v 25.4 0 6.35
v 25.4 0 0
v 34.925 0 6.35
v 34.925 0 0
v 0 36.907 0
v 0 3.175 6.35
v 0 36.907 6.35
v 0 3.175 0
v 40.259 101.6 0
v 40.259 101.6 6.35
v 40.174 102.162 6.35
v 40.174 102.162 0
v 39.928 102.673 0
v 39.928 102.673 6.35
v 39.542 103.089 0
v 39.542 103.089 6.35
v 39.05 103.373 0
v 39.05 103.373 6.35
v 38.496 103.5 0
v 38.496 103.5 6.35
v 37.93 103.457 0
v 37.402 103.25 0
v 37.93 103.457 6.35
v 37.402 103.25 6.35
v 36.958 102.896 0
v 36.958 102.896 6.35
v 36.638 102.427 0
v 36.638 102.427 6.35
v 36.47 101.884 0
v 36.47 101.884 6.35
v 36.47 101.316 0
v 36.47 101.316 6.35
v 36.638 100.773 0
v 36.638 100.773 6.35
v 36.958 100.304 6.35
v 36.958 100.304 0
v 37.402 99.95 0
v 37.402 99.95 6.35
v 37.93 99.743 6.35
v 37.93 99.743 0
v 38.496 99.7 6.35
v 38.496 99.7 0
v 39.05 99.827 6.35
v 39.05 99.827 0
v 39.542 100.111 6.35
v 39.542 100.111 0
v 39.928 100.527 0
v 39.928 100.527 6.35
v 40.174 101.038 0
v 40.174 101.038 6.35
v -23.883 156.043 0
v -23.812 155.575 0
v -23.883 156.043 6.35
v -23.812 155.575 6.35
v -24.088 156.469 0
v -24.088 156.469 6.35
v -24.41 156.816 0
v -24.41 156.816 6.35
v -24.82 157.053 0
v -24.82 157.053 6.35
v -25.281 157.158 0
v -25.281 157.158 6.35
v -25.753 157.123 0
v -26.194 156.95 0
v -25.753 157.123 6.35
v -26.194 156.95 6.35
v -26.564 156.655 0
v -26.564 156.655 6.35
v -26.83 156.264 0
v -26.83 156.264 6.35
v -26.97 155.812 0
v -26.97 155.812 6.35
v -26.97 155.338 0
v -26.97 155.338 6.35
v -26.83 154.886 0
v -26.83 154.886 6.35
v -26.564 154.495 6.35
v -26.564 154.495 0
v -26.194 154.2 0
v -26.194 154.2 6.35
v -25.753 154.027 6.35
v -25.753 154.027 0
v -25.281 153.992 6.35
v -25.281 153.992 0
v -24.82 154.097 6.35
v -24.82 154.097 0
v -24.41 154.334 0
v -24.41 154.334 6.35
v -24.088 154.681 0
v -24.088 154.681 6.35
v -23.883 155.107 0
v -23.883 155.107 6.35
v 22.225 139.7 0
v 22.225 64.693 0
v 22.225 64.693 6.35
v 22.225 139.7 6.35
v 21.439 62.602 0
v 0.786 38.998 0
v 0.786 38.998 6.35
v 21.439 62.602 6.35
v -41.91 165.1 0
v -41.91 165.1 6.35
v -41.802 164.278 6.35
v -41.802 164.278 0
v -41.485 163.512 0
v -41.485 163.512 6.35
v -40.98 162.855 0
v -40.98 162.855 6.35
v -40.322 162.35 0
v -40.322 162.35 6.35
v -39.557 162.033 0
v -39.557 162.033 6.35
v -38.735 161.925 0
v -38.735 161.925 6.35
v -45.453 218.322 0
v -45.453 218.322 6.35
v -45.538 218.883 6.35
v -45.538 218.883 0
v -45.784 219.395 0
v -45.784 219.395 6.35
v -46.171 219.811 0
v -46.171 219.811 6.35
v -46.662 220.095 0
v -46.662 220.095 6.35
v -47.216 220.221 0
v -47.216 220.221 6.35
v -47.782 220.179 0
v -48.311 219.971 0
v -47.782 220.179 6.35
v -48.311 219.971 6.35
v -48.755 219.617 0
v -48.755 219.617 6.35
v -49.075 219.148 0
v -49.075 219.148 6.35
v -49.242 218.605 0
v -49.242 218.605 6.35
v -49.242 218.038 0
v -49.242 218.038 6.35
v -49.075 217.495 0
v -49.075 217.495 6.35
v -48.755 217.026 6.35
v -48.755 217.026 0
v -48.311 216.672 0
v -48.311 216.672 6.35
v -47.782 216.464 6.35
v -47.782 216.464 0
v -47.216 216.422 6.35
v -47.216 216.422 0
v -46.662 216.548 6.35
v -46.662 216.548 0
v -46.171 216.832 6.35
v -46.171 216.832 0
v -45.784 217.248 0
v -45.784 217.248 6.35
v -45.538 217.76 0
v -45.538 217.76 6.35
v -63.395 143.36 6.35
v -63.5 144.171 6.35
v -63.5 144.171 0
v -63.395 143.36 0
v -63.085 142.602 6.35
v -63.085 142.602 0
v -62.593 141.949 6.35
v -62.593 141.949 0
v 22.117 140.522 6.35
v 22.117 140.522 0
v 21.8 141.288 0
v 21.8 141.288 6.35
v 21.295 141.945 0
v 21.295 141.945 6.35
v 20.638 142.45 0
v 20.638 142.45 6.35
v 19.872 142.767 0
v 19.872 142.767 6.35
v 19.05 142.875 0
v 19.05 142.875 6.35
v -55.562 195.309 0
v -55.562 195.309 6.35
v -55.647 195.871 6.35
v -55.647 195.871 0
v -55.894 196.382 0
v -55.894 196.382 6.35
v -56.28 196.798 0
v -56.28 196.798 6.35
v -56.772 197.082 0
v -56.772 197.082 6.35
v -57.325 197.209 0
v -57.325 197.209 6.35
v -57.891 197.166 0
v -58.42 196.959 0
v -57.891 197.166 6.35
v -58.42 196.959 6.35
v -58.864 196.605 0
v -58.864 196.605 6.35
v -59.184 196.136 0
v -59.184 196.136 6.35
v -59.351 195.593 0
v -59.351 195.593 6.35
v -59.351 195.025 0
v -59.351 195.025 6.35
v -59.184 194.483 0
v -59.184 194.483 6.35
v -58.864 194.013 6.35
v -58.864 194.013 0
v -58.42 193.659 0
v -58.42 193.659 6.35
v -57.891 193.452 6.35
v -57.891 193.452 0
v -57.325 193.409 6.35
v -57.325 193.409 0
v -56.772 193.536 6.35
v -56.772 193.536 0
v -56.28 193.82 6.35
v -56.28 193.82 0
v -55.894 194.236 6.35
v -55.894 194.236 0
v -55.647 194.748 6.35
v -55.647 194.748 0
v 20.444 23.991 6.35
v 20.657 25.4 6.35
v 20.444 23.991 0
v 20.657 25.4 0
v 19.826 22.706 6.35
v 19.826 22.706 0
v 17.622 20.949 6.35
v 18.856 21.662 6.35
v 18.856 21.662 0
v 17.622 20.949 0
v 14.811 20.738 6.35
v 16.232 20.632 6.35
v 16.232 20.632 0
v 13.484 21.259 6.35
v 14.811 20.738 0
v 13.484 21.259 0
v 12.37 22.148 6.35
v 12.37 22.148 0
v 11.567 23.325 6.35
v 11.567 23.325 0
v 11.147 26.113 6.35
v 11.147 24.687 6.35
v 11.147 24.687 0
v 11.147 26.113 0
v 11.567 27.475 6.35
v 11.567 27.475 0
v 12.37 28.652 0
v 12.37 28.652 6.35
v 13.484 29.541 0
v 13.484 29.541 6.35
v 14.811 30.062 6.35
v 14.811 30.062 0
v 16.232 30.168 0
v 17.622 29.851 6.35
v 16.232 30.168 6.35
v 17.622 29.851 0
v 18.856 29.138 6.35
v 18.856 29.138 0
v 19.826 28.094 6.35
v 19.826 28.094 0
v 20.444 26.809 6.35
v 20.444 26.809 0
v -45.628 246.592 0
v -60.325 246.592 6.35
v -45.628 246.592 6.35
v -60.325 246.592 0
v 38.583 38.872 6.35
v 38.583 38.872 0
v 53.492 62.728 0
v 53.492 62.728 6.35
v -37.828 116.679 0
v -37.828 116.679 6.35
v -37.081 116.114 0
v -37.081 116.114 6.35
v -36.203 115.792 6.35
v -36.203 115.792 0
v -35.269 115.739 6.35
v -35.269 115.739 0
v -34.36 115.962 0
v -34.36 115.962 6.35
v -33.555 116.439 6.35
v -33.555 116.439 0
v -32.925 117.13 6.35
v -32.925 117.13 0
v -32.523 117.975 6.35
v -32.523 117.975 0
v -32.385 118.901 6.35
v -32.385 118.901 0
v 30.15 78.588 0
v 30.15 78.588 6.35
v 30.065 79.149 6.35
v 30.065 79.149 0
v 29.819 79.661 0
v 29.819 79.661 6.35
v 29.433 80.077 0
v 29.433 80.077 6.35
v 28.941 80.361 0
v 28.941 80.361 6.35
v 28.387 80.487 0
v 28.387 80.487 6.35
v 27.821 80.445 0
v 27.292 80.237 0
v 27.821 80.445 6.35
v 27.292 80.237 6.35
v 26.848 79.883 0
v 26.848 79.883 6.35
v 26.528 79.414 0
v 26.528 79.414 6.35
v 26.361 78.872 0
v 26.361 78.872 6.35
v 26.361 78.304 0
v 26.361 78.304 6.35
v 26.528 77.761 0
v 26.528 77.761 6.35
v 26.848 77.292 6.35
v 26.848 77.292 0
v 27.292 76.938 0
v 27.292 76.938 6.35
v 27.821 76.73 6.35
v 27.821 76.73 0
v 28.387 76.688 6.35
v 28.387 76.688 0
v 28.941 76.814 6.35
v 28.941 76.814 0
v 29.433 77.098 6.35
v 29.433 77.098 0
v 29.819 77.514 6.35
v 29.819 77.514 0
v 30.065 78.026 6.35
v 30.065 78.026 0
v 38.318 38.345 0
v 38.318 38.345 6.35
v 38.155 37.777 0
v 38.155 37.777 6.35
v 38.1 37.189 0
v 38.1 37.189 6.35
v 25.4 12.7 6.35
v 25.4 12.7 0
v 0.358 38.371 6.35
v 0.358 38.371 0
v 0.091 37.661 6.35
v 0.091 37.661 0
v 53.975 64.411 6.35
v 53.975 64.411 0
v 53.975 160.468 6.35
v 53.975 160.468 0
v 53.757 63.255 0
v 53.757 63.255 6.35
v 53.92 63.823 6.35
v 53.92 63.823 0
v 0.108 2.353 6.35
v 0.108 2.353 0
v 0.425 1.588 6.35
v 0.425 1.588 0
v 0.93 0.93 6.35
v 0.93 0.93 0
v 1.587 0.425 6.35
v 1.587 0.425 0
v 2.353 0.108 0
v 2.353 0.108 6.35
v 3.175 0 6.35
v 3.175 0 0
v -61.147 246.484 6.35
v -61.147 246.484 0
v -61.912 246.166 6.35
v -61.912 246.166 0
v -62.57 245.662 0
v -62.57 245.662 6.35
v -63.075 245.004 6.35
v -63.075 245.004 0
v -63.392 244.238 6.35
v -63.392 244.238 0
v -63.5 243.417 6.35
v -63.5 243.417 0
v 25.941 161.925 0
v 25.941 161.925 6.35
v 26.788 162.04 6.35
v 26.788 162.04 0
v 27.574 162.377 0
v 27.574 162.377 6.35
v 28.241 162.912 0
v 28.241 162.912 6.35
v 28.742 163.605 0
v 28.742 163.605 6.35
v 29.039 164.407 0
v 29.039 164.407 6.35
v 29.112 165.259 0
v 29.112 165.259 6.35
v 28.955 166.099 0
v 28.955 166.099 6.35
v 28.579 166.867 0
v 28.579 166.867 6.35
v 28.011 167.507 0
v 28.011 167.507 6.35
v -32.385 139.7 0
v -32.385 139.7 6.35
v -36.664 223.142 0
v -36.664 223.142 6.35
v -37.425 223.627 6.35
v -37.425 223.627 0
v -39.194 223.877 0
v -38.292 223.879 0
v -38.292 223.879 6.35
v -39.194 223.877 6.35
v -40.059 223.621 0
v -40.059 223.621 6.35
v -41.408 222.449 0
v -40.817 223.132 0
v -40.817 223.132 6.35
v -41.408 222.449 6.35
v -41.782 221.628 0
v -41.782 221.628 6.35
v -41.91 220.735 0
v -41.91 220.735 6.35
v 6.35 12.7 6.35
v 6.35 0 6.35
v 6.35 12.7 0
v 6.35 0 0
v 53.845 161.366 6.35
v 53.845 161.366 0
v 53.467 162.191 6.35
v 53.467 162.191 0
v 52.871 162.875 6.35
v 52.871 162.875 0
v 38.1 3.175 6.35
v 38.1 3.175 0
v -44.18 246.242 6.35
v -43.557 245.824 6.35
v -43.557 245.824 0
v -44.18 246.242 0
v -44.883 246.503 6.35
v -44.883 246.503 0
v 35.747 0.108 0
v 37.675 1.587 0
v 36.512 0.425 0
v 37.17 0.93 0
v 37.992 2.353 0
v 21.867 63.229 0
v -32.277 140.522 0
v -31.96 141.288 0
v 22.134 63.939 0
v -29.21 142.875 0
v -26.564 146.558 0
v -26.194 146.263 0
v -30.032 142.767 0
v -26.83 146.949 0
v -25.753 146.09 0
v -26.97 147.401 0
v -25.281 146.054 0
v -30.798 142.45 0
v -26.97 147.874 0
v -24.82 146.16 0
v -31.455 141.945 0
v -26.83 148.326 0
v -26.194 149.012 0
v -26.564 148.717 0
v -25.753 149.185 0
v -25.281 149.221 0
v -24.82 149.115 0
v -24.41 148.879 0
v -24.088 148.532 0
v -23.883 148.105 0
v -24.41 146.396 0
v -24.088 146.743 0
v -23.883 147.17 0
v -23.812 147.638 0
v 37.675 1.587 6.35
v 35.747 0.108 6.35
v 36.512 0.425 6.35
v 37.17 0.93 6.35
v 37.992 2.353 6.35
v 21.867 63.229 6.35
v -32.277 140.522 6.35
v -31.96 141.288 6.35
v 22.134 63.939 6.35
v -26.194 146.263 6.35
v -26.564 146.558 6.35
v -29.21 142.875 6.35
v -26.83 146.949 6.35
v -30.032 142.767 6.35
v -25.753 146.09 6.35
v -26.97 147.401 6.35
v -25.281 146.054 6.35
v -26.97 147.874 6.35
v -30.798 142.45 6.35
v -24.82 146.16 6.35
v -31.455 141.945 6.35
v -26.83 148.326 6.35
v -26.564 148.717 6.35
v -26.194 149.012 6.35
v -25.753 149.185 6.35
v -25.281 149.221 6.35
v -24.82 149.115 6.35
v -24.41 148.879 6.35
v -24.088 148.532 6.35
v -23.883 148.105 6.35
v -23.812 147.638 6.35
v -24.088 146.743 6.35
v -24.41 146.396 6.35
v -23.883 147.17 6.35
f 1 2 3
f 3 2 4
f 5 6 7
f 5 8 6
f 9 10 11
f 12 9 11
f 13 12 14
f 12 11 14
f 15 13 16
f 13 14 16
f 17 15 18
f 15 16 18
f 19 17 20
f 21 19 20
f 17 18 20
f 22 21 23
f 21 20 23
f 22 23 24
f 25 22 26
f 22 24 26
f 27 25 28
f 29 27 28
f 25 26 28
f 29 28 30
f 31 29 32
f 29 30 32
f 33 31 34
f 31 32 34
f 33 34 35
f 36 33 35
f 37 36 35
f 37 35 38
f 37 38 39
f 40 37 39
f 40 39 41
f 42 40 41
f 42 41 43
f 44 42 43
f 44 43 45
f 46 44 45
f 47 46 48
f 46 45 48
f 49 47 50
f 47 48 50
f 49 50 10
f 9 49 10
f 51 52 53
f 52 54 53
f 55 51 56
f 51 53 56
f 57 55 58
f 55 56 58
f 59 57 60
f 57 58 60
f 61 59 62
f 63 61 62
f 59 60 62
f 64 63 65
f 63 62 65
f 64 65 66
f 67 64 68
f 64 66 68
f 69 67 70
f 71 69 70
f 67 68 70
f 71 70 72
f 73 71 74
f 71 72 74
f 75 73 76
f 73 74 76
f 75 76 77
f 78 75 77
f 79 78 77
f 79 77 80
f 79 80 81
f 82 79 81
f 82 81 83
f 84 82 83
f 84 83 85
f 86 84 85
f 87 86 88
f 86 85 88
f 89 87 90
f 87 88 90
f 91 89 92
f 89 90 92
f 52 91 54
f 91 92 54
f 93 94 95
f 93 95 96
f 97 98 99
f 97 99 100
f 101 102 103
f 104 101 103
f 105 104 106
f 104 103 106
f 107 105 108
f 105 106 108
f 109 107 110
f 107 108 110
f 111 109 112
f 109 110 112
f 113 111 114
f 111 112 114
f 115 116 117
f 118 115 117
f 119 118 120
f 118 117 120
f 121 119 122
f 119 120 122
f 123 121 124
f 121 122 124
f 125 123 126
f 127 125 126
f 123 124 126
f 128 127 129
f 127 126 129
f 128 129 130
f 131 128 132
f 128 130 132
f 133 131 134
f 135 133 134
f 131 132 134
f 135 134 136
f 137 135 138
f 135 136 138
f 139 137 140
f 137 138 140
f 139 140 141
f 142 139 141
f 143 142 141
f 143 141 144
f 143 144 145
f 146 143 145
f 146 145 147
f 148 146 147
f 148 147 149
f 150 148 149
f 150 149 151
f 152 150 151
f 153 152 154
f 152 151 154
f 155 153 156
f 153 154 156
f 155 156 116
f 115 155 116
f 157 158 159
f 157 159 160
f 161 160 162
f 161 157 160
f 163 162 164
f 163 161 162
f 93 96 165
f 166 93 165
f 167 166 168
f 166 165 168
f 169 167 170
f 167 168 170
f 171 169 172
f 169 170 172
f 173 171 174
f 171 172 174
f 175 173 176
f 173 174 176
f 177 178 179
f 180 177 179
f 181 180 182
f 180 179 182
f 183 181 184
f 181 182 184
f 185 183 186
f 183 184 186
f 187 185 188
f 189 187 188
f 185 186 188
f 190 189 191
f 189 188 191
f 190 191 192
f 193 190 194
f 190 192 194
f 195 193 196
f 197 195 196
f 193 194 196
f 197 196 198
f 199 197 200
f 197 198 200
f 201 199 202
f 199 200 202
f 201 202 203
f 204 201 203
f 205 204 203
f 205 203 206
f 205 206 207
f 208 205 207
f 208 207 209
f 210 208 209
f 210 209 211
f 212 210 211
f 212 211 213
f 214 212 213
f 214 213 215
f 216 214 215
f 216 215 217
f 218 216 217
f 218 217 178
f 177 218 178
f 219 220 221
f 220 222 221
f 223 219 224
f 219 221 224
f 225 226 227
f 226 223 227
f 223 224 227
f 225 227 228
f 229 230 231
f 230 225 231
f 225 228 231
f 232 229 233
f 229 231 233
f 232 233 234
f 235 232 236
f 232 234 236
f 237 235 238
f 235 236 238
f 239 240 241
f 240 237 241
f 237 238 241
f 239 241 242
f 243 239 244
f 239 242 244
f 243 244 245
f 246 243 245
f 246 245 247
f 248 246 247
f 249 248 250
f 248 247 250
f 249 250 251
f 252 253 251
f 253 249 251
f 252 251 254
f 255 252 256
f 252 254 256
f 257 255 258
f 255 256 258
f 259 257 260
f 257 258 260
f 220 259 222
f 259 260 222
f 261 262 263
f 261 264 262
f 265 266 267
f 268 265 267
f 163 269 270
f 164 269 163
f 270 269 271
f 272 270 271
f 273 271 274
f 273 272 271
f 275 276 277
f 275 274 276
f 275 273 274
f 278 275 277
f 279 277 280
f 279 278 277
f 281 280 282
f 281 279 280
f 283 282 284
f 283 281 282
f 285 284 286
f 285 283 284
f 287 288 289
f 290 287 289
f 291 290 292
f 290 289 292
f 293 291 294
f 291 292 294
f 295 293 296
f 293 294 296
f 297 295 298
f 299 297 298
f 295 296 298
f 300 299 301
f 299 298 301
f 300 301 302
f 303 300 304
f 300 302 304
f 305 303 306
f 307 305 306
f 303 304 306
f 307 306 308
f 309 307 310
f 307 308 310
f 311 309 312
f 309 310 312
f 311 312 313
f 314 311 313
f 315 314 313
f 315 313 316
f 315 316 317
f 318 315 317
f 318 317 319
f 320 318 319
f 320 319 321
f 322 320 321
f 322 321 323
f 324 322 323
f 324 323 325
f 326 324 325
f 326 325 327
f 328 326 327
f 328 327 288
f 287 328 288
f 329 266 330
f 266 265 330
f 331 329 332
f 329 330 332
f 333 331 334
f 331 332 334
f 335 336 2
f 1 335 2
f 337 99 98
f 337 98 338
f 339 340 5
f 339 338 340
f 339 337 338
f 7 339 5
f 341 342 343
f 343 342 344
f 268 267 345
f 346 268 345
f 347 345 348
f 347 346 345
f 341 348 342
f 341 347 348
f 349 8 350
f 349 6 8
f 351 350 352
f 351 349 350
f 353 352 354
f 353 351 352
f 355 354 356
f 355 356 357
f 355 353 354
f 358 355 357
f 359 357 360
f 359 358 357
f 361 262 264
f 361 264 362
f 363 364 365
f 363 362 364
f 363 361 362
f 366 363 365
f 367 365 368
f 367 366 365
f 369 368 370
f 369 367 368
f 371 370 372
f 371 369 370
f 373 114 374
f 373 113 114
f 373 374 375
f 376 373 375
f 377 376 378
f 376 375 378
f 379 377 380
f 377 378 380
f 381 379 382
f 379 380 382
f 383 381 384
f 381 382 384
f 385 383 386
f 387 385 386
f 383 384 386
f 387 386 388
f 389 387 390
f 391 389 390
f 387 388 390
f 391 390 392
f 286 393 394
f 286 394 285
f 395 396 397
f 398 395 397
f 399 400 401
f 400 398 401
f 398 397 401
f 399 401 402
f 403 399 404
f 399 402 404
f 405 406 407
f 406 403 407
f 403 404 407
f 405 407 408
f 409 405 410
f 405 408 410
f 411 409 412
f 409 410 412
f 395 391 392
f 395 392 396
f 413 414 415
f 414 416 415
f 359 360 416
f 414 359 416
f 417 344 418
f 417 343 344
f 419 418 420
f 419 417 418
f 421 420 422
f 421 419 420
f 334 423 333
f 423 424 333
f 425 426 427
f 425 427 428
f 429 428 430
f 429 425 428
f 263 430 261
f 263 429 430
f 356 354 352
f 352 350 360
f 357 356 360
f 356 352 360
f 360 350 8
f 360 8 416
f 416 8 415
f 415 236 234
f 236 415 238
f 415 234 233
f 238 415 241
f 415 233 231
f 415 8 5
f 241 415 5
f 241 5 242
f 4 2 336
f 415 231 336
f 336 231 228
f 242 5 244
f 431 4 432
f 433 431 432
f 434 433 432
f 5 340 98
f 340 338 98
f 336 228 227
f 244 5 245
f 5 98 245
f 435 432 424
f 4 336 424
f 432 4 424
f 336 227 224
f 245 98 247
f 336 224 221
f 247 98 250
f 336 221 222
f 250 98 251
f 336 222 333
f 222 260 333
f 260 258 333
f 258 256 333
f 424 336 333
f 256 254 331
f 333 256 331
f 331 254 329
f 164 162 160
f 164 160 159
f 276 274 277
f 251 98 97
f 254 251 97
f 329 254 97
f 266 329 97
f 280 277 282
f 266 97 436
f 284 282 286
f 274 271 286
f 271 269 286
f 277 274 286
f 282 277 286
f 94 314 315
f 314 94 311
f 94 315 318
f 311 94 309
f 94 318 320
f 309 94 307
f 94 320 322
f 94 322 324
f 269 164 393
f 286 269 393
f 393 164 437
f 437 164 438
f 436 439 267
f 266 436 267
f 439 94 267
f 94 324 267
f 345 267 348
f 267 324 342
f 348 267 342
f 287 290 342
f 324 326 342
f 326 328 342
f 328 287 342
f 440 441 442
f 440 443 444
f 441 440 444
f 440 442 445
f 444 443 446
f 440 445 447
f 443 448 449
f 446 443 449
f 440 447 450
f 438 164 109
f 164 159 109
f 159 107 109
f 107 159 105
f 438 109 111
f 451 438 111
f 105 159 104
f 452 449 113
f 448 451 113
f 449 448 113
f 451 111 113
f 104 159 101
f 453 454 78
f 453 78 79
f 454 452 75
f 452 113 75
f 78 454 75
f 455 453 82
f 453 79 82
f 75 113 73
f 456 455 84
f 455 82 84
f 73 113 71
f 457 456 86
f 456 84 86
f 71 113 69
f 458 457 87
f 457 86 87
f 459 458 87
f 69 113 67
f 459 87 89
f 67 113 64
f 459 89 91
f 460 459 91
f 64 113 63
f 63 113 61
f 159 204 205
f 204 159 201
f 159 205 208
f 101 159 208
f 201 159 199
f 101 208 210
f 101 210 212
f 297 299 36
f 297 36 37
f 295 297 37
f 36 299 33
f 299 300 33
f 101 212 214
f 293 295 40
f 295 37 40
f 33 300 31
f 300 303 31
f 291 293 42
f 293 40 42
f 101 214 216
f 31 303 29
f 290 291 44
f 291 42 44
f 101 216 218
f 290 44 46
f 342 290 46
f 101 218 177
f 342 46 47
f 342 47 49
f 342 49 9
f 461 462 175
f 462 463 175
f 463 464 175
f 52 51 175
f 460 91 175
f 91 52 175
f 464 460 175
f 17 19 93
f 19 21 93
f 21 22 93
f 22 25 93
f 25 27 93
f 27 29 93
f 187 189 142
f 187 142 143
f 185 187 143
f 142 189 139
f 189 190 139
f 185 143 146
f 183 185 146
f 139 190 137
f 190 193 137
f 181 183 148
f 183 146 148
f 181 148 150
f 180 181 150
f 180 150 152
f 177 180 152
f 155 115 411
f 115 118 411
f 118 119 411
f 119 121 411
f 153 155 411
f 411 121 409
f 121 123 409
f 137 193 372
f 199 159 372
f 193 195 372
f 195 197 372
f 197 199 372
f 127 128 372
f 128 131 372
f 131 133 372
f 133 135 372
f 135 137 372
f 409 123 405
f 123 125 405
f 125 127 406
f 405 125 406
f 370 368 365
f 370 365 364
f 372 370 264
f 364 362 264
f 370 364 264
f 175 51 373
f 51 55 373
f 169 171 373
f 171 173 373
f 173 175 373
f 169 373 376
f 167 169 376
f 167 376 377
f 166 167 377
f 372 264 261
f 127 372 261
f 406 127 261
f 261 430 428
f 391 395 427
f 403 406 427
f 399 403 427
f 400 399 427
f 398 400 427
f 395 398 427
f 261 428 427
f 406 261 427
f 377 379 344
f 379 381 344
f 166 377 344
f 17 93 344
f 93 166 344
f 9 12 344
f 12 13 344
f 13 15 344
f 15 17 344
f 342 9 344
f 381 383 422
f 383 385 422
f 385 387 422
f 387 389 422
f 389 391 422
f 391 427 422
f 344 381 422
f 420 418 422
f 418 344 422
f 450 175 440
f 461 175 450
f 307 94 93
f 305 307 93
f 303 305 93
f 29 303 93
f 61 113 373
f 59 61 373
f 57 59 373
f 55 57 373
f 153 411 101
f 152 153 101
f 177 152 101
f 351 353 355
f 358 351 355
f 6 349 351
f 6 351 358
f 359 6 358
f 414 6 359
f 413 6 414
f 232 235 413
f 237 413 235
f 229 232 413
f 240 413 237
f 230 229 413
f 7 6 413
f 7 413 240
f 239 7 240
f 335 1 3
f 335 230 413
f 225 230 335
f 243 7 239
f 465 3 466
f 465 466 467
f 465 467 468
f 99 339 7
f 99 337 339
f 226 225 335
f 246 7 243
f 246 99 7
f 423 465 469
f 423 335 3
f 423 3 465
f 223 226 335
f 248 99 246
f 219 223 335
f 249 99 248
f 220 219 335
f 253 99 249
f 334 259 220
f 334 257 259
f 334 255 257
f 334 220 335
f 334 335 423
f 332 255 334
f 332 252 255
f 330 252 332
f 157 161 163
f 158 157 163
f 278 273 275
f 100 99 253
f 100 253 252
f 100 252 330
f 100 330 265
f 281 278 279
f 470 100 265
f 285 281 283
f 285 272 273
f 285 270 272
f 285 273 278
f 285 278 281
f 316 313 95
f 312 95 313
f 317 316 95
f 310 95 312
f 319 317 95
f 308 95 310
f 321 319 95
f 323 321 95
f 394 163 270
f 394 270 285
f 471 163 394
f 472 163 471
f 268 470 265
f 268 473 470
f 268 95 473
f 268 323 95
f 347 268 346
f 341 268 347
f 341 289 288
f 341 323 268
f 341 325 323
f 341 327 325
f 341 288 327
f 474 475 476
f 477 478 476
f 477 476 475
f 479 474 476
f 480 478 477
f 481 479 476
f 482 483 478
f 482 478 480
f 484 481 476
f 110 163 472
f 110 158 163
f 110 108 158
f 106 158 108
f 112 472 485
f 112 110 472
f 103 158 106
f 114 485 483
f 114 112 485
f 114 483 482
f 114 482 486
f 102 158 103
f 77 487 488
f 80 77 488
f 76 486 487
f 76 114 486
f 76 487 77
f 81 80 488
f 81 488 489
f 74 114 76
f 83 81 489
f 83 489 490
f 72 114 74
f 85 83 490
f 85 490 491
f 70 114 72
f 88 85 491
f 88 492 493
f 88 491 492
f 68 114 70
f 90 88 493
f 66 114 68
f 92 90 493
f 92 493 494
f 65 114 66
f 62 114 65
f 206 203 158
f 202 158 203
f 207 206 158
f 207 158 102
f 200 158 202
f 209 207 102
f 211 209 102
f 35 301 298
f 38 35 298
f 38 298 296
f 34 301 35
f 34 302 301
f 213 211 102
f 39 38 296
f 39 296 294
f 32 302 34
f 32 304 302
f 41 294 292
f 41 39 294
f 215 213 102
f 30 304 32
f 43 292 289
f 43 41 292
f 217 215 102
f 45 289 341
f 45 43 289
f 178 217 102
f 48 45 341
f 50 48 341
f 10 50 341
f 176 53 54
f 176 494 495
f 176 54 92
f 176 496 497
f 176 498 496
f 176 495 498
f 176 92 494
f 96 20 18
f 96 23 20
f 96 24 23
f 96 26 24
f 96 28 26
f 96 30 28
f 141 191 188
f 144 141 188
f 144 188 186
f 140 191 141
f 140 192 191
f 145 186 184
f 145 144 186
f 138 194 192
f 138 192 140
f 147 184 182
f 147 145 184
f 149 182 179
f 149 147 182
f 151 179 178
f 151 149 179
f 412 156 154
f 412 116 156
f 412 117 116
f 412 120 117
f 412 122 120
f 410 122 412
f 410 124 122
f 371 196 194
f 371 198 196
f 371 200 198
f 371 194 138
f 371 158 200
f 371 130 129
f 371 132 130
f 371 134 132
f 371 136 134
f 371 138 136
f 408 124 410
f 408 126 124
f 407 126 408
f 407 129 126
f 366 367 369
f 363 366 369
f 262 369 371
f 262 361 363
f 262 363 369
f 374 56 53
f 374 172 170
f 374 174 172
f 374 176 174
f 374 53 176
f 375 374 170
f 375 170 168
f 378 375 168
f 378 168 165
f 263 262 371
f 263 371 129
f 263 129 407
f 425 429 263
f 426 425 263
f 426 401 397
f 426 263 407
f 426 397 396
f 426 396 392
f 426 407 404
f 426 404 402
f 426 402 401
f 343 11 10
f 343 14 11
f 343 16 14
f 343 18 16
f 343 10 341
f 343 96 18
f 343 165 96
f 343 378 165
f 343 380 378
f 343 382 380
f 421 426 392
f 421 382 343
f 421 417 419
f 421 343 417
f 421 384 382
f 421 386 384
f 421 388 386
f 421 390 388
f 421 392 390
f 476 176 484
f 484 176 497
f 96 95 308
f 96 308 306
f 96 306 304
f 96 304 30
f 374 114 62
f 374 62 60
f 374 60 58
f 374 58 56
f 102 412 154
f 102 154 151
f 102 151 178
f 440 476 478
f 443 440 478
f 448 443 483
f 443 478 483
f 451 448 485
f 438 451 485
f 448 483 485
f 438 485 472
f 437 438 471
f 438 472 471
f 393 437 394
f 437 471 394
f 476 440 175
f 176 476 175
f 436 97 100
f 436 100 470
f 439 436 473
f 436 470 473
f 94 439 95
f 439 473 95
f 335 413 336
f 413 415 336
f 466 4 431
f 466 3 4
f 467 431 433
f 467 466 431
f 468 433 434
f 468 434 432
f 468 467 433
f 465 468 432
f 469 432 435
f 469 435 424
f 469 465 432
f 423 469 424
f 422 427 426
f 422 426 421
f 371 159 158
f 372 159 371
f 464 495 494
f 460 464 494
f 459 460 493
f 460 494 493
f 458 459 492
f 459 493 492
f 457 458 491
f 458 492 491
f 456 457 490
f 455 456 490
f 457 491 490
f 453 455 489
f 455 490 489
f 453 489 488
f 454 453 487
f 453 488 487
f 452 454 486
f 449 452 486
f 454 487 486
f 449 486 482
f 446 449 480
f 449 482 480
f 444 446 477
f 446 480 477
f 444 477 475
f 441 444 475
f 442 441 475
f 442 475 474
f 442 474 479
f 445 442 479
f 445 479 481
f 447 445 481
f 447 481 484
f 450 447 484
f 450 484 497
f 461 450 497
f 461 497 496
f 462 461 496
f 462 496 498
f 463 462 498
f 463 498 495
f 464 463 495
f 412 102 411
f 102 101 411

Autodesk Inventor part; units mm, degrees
ref_plane "YZ Plane" through (0, 0, 0) normal (1, 0, 0) x (0, 1, 0)
ref_plane "XZ Plane" through (0, 0, 0) normal (0, 1, 0) x (-1, 0, 0)
ref_plane "XY Plane" through (0, 0, 0) normal (0, 0, 1) x (1, 0, 0)
sketch "Sketch1" plane through (0, 0, 0) normal (0, 0, 1) x (1, 0, 0)
  line L0 (0, 0) -> (6.35, 0)
  line L1 (6.35, 0) -> (6.35, 12.7)
  line L2 (6.35, 12.7) -> (25.4, 12.7)
  line L3 (25.4, 12.7) -> (25.4, 0)
  line L4 (25.4, 0) -> (31.75, 0)
  circle A0 centre (15.875, 25.4) radius 4.7816
  line L5 (-32.385, 142.875) -> (-32.385, 111.125)
  line L6 (-32.385, 142.875) -> (22.225, 142.875)
  line L7 (31.75, 38.1) -> (0, 38.1) construction
  line L8 (53.975, -44.5659) -> (53.975, 161.925) construction
  line L9 (0, 38.1) -> (22.225, 63.5)
  line L10 (53.975, 63.5) -> (53.975, 161.925)
  line L11 (0, 0) -> (0, 38.1)
  line L12 (31.75, 0) -> (38.1, 0)
  line L13 (38.1, 0) -> (38.1, 38.1)
  line L14 (38.1, 38.1) -> (53.975, 63.5)
  line L15 (53.975, 63.5) -> (53.975, 161.925)
  line L16 (22.225, 63.5) -> (22.225, 142.875)
  line L17 (-32.385, 142.875) -> (22.225, 142.875)
  line L18 (0, 0) -> (0, 38.1)
  line L19 (0, 38.1) -> (22.225, 63.5)
  line L20 (22.225, 63.5) -> (22.225, 142.875)
  line L21 (22.225, 142.875) -> (-32.385, 142.875)
  line L22 (-32.385, 142.875) -> (-32.385, 111.125)
  line L23 (6.35, 12.7) -> (25.4, 12.7)
  line L24 (25.4, 12.7) -> (25.4, 0)
  line L25 (38.1, 0) -> (25.4, 0)
  line L26 (38.1, 0) -> (38.1, 38.1)
  line L27 (53.975, 63.5) -> (38.1, 38.1)
  line L28 (53.975, 63.5) -> (53.975, 161.925)
  line L29 (38.1, 0) -> (25.4, 0)
  line L30 (-63.5, -52.3717) -> (-63.5, 366.3054) construction
  line L31 (-63.5, 142.875) -> (-63.5, 246.5917)
  line L32 (-63.5, 246.5917) -> (-44.45, 246.5917)
  line L33 (-32.385, 111.125) -> (-63.5, 142.875)
  line L34 (-44.45, 246.5917) -> (53.975, 161.925)
  line L35 (-41.91, 161.925) -> (34.5004, 161.925)
  line L36 (34.5004, 161.925) -> (-41.91, 227.6544)
  line L37 (-41.91, 161.925) -> (-41.91, 227.6544)
  dimension "d0" = 6.35
  dimension "d1" = 12.7
  dimension "d2" = 19.05
  dimension "d3" = 6.35
  dimension "d5" = 9.5631
  dimension "d6" = 12.7
  dimension "d7" = 9.525
  dimension "d11" = 31.75
  dimension "d23" = 25.4
  dimension "d24" = 38.1
  dimension "d25" = 25.4
  dimension "d26" = 38.1
  dimension "d27" = 54.61
  dimension "d32" = 6.35
  dimension "d33" = 22.225
  dimension "d34" = 38.1
  dimension "d36" = 79.375
  dimension "d60" = 117.475
  dimension "d61" = 103.7167
  dimension "d62" = 19.05
  dimension "d64" = 31.75
  dimension "d66" = 31.115
  dimension "d88" = 12.7
  dimension "d89" = 40.703
  dimension "d91" = 21.59
  dimension "d92" = 19.05
ref_plane "Work Plane1" through (0, 0, 9.525) normal (0, 0, 1) x (1, 0, 0)
ref_plane "Work Plane2" through (0, 0, 9.525) normal (0, 0, 1) x (1, 0, 0)
extrude "Extrusion6" add sketch "Sketch1" along normal blind 6.35
sketch "Sketch5" plane through (0, 0, 6.35) normal (0, 0, 1) x (1, 0, 0)
  line L0 (-44.45, 246.5917) -> (-63.5, 246.5917) projected
  line L1 (-63.5, 246.5917) -> (-63.5, 142.875) projected
  circle A0 centre (-47.3583, 218.3215) radius 1.905
  circle A1 centre (-57.4675, 195.3091) radius 1.905
  dimension "d95" = 3.81
  dimension "d96" = 3.81
  dimension "d97" = 28.2702
  dimension "d98" = 51.2826
  dimension "d99" = 6.0325
  dimension "d100" = 16.1417
extrude "Extrusion7" cut sketch "Sketch5" against normal blind 9.525
fillet "Fillet3" radius 3.175 16 edges at (-44.45, 246.5917, 3.175) (-63.5, 246.5917, 3.175) (53.975, 161.925, 3.175) (-41.91, 161.925, 3.175) (53.975, 63.5, 3.175) (38.1, 38.1, 3.175) (38.1, 0, 3.175) (0, 0, 3.175) (0, 38.1, 3.175) (22.225, 63.5, 3.175) (22.225, 142.875, 3.175) (-32.385, 111.125, 3.175) (-63.5, 142.875, 3.175) (-32.385, 142.875, 3.175) (-41.91, 227.6544, 3.175) (34.5004, 161.925, 3.175)
sketch "Sketch6" plane through (0, 0, 6.35) normal (0, 0, 1) x (1, 0, 0)
  line L0 (-29.21, 142.875) -> (19.05, 142.875) projected
  line L1 (25.9409, 161.925) -> (-38.735, 161.925) projected
  circle A0 centre (-25.4, 155.575) radius 1.5875
  circle A1 centre (-25.4, 147.6375) radius 1.5875
  line L2 (-63.5, 243.4167) -> (-63.5, 144.1714) projected
  point P0 (0, 0)
  dimension "d104" = 3.175
  dimension "d105" = 3.175
  dimension "d106" = 4.7625
  dimension "d107" = 6.35
  dimension "d110" = 38.1
  dimension "d111" = 38.1
extrude "Extrusion8" cut sketch "Sketch6" against normal blind 9.525
sketch "Sketch7" plane through (0, 0, 6.35) normal (0, 0, 1) x (1, 0, 0)
  line L0 (-29.21, 142.875) -> (19.05, 142.875) projected
  line L1 (22.225, 139.7) -> (22.225, 64.693) projected
  line L2 (-44.45, 165.1) -> (-44.45, 222.9201) projected
  line L3 (122.6353, 104.775) -> (-142.2483, 104.775) construction
  circle A0 centre (38.354, 101.6) radius 1.905
  circle A1 centre (28.2448, 78.5876) radius 1.905
  point P0 (0, 0)
  dimension "d112" = 38.1
  dimension "d113" = 3.81
  dimension "d114" = 3.81
  dimension "d115" = 23.0124
  dimension "d116" = 10.1092
  dimension "d117" = 6.0198
  dimension "d118" = 3.175
extrude "Extrusion9" cut sketch "Sketch7" against normal blind 9.525
properties part number "Bent Right Hook" material "Aluminum 6061"
